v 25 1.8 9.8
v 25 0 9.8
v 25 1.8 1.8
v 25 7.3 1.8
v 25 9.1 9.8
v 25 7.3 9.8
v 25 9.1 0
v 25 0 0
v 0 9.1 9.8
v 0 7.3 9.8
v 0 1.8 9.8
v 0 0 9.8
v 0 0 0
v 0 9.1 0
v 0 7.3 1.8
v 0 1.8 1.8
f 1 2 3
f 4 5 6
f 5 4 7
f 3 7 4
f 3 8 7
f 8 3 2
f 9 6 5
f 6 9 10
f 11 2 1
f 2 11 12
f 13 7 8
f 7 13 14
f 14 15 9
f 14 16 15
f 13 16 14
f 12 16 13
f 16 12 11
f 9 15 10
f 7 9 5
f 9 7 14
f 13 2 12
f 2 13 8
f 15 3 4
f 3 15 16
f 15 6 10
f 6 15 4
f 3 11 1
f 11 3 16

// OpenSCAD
// Bracket for the anycubic Ultrabase
// makes sure the glued on base sticks flat and evenly to the heat-bed

/* [Size] */

// combined height of the ultrabase and heat-bed
base_height = 5.5; //[4.5:0.1:7]

// width of the bracket
bracket_width = 25; //[10:1:50]

// depth of the bracket
bracket_depth = 8; //[6:1:20]

// wall thickness
wall = 1.8; //[1:0.1:4]

difference() {
    cube([bracket_width, base_height + wall * 2, wall + bracket_depth]);
    translate([-0.1, wall, wall])
        cube([bracket_width + 0.2, base_height, wall + bracket_depth]);
}
